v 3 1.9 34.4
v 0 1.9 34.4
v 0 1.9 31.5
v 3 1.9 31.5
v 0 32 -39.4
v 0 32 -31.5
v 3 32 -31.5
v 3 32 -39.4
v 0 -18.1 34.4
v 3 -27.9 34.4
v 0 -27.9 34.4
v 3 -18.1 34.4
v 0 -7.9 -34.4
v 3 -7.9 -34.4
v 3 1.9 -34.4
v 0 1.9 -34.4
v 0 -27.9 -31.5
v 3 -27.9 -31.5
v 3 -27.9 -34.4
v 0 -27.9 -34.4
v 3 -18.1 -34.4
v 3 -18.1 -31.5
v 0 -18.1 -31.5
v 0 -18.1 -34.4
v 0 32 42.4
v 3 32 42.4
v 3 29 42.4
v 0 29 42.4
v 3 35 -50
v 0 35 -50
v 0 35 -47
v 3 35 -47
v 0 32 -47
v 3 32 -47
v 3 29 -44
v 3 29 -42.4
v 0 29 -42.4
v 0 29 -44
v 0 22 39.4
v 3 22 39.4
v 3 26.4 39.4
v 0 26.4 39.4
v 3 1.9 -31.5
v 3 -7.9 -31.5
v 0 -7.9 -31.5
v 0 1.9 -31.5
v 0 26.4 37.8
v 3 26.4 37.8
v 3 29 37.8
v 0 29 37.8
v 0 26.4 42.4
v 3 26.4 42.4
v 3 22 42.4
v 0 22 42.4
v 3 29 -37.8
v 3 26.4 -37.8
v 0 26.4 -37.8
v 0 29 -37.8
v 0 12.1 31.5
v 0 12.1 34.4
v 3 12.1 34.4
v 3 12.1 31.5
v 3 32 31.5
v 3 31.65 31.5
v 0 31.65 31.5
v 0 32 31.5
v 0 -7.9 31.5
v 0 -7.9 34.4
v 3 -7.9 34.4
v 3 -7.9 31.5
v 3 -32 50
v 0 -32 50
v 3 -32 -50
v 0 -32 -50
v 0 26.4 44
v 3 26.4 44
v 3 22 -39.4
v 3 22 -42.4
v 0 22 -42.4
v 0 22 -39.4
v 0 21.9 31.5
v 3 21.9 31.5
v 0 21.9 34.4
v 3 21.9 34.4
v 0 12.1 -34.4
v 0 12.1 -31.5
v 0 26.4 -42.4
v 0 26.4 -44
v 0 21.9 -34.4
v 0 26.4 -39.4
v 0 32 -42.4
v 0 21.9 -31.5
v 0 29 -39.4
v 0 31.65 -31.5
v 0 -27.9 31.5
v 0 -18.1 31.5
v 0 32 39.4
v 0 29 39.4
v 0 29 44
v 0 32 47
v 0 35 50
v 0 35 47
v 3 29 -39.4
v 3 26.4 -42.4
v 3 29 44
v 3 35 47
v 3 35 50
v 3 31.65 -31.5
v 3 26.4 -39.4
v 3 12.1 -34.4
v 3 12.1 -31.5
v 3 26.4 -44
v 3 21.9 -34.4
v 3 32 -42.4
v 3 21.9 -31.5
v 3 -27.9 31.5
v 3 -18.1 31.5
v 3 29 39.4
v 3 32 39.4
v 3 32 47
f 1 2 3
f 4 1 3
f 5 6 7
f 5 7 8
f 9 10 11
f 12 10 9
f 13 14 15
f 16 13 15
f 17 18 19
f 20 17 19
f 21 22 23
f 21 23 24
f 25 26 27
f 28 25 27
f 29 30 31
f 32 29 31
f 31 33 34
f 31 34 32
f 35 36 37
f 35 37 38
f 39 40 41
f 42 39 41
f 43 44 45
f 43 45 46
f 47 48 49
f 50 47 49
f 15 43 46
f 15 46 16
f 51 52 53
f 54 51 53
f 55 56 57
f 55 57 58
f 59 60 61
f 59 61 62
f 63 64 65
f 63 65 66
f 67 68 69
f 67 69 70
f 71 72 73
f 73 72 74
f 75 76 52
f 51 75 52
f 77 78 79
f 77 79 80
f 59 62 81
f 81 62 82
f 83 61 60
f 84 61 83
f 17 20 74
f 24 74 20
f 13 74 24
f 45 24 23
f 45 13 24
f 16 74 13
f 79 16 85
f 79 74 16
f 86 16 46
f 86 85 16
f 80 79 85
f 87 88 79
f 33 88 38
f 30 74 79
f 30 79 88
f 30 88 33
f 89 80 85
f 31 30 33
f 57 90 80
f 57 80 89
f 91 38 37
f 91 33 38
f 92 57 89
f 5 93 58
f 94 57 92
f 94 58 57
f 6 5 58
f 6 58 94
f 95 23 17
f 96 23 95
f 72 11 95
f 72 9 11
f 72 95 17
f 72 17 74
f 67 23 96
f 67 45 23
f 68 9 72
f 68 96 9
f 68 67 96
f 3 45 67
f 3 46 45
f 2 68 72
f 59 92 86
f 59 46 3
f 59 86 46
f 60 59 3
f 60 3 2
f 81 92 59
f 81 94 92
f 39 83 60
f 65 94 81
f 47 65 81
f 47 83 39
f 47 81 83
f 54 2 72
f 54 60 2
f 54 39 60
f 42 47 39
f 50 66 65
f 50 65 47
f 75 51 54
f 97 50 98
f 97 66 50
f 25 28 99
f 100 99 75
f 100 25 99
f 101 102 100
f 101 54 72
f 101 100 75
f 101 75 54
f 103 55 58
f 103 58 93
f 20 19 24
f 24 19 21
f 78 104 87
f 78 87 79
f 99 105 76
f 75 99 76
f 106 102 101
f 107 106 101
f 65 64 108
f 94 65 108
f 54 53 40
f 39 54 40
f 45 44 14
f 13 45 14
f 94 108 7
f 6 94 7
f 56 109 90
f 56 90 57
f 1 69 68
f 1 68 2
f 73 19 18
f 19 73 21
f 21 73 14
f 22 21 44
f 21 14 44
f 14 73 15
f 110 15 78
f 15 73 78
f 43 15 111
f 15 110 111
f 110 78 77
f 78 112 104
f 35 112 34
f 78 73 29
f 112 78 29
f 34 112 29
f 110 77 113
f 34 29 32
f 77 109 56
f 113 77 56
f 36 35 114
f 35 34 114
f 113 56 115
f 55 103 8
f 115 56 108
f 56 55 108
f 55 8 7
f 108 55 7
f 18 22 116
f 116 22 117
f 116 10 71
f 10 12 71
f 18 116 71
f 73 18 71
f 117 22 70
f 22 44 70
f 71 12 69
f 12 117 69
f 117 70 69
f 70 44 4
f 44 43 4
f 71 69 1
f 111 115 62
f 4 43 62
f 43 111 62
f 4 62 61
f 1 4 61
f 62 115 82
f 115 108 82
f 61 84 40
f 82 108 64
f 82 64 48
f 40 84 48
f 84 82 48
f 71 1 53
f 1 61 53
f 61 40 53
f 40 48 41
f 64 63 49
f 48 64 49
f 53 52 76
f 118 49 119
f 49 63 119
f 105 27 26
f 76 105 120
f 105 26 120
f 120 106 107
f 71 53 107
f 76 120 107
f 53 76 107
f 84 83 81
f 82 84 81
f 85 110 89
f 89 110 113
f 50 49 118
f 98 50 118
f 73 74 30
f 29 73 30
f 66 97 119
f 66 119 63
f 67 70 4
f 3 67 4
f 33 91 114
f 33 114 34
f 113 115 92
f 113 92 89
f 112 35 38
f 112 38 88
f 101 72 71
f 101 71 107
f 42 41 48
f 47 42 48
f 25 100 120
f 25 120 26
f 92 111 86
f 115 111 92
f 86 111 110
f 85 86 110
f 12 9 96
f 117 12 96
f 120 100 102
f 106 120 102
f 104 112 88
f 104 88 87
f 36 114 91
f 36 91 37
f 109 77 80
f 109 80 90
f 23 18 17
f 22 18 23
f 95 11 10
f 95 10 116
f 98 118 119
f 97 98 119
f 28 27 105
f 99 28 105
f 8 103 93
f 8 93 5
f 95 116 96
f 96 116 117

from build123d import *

# Parameters (mm, degrees)
SKETCH1_W           = 100
SKETCH1_H           = 64
BOSS_EXTRUDE1_DEPTH = 3
SKETCH2_W           = 2.9
SKETCH2_H           = 9.8
CUT_EXTRUDE1_DEPTH  = 3
CUT_EXTRUDE2_DEPTH  = 10
SKETCH5_W           = 63
SKETCH5_H           = 0.35
CUT_EXTRUDE3_DEPTH  = 10
SKETCH6_W           = 3
SKETCH6_H           = 3
BOSS_EXTRUDE3_DEPTH = 3


with BuildPart() as part:
    # Sketch1 → Boss-Extrude1 (new body)
    with BuildSketch(Plane(origin=(0, 0, 0), x_dir=(0, 0, -1), z_dir=(1, 0, 0))):
        Rectangle(SKETCH1_W, SKETCH1_H)
    extrude(amount=BOSS_EXTRUDE1_DEPTH)

    # Sketch2 → Cut-Extrude1 (cut)
    with BuildSketch(Plane(origin=(3, 0, 0), x_dir=(0, 0, -1), z_dir=(1, 0, 0))):
        with Locations((-32.95, 17)):
            Rectangle(SKETCH2_W, SKETCH2_H)
        with Locations((-32.95, -3)):
            Rectangle(SKETCH2_W, SKETCH2_H)
        with Locations((-32.95, -23)):
            Rectangle(SKETCH2_W, SKETCH2_H)
        with Locations((32.95, -23)):
            Rectangle(SKETCH2_W, SKETCH2_H)
        with Locations((32.95, -3)):
            Rectangle(SKETCH2_W, SKETCH2_H)
        with Locations((32.95, 17)):
            Rectangle(SKETCH2_W, SKETCH2_H)
    extrude(amount=-CUT_EXTRUDE1_DEPTH, mode=Mode.SUBTRACT)

    # Sketch3 → Cut-Extrude2 (cut)
    with BuildSketch(Plane(origin=(3, 0, 0), x_dir=(0, 0, -1), z_dir=(1, 0, 0))):
        Polygon((-42.4, 32), (-42.4, 29), (-44, 29), (-44, 26.4), (-42.4, 26.4), (-42.4, 22), (-39.4, 22), (-39.4, 26.4), (-37.8, 26.4), (-37.8, 29), (-39.4, 29), (-39.4, 32), align=None)
    cut_extrude2 = extrude(amount=-CUT_EXTRUDE2_DEPTH, mode=Mode.SUBTRACT)

    # Mirror1: Cut-Extrude2 across plane
    add(cut_extrude2.mirror(Plane.XY), mode=Mode.SUBTRACT)

    # Sketch5 → Cut-Extrude3 (cut)
    with BuildSketch(Plane(origin=(3, 0, 0), x_dir=(0, 0, -1), z_dir=(1, 0, 0))):
        with Locations((0, 31.825)):
            Rectangle(SKETCH5_W, SKETCH5_H)
    extrude(amount=-CUT_EXTRUDE3_DEPTH, mode=Mode.SUBTRACT)

    # Sketch6 → Boss-Extrude3 (add)
    with BuildSketch(Plane.ZY):
        with Locations((-48.5, 33.5)):
            Rectangle(SKETCH6_W, SKETCH6_H)
        with Locations((48.5, 33.5)):
            Rectangle(SKETCH6_W, SKETCH6_H)
    extrude(amount=-BOSS_EXTRUDE3_DEPTH)


solid = part.part
